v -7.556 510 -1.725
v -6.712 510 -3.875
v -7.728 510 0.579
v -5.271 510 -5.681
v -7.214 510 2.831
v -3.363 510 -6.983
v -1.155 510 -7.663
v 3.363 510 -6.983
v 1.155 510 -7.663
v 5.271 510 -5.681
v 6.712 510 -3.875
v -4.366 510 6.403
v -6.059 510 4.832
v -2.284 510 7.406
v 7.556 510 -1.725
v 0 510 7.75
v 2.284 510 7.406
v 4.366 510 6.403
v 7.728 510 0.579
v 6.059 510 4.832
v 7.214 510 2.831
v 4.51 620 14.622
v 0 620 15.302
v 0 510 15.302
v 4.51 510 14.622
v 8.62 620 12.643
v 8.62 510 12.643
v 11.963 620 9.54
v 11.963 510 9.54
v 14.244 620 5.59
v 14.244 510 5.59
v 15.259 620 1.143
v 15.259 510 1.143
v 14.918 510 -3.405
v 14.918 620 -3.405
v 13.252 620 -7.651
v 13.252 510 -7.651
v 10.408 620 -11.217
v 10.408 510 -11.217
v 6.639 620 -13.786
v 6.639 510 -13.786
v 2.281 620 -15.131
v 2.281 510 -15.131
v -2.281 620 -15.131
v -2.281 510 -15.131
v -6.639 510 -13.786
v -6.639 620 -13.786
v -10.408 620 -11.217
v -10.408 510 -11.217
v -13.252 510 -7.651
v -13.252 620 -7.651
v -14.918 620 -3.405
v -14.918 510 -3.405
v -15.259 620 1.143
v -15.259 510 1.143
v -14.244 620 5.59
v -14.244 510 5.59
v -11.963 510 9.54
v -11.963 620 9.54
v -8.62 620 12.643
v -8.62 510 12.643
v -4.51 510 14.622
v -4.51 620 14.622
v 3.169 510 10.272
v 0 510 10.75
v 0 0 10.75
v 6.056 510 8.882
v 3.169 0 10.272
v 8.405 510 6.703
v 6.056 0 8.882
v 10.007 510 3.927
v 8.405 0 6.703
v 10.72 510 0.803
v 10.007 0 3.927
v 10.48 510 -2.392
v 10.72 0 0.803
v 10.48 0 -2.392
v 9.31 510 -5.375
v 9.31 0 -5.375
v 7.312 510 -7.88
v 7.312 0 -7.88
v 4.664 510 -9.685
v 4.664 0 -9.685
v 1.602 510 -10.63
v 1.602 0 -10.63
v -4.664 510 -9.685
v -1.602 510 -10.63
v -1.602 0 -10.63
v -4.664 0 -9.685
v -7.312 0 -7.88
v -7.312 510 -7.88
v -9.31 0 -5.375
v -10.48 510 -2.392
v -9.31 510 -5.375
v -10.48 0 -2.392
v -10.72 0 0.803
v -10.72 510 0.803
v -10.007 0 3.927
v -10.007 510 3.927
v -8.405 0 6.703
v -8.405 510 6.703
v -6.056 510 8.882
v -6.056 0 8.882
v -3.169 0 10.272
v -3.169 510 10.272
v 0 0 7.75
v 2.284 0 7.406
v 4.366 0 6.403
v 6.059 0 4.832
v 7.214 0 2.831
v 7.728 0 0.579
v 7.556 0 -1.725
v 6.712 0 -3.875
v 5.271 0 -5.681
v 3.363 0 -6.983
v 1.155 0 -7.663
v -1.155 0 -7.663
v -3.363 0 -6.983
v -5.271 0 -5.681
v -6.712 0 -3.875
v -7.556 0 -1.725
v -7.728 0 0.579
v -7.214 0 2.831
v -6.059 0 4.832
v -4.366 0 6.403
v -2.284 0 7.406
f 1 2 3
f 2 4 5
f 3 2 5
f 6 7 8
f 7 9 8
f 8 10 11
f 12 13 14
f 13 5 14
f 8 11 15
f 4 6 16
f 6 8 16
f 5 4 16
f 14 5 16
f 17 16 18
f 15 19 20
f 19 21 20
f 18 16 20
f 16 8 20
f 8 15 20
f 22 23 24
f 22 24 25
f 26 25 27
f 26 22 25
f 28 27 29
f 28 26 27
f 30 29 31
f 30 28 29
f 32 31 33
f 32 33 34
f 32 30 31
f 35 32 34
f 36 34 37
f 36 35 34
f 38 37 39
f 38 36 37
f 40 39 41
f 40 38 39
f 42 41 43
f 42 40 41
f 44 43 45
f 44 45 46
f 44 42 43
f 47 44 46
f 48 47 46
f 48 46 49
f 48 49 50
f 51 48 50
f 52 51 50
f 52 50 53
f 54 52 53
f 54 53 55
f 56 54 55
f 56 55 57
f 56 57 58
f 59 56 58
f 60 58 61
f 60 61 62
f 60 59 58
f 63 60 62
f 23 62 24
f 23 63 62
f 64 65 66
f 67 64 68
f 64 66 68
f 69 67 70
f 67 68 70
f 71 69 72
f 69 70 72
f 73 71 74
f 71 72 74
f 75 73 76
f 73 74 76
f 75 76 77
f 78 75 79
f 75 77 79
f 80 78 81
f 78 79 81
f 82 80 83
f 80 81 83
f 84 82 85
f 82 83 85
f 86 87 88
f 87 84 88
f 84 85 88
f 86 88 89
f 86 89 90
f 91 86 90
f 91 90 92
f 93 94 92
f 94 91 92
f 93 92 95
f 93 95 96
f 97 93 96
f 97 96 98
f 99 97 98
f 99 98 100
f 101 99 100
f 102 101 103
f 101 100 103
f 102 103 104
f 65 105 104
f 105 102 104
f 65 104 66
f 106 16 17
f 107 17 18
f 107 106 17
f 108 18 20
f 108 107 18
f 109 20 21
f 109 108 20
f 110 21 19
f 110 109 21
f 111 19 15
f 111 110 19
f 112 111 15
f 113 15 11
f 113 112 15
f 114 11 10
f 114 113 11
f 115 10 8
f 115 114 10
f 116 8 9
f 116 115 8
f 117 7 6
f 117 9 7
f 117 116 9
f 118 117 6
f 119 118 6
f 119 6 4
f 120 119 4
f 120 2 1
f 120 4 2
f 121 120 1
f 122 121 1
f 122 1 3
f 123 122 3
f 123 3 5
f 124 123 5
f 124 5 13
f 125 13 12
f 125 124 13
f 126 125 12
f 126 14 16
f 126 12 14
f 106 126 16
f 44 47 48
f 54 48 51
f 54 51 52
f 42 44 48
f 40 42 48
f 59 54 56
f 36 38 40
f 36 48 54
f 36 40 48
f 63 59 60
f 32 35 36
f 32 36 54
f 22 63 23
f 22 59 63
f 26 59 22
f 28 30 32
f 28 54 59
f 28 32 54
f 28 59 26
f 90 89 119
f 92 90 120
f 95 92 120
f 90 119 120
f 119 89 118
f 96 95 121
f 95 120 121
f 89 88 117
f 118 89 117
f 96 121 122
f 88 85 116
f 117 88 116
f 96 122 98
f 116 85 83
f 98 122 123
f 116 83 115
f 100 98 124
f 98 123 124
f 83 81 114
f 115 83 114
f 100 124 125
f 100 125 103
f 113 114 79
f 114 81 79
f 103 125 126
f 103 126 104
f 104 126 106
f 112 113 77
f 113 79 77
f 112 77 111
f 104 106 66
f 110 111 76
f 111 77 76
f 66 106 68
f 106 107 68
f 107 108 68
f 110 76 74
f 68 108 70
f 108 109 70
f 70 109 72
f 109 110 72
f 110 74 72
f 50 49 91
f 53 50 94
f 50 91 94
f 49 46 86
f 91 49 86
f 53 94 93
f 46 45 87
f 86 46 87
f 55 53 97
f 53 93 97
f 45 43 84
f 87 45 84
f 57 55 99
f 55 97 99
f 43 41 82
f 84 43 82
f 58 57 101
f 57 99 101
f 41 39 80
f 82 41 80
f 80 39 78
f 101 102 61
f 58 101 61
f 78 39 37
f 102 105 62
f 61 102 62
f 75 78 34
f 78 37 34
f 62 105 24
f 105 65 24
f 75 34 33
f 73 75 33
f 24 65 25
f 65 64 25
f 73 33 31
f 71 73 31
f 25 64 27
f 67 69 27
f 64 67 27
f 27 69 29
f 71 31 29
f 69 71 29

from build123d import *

# Parameters (mm, degrees)
SKETCH_1_R      = 10.75
SKETCH_1_R_2    = 7.75
EXTRUDE_1_DEPTH = 620
SKETCH_2_R      = 15.301580628
EXTRUDE_2_DEPTH = 110


with BuildPart() as part:
    # Эскиз1 → Бобышка-Вытянуть1 (new body)
    with BuildSketch(Plane(origin=(0, 0, 0), x_dir=(1, 0, 0), z_dir=(0, 1, 0))):
        with Locations(Location((0, 0, 0), (0, 0, 270))):
            Circle(SKETCH_1_R)
        with Locations(Location((0, 0, 0), (0, 0, 270))):
            Circle(SKETCH_1_R_2, mode=Mode.SUBTRACT)
    extrude(amount=EXTRUDE_1_DEPTH)

    # Эскиз2 → Бобышка-Вытянуть2 (add)
    with BuildSketch(Plane(origin=(0, 620, 0), x_dir=(1, 0, 0), z_dir=(0, 1, 0))):
        with Locations(Location((0, 0, 0), (0, 0, 270))):
            Circle(SKETCH_2_R)
    extrude(amount=-EXTRUDE_2_DEPTH)


solid = part.part
